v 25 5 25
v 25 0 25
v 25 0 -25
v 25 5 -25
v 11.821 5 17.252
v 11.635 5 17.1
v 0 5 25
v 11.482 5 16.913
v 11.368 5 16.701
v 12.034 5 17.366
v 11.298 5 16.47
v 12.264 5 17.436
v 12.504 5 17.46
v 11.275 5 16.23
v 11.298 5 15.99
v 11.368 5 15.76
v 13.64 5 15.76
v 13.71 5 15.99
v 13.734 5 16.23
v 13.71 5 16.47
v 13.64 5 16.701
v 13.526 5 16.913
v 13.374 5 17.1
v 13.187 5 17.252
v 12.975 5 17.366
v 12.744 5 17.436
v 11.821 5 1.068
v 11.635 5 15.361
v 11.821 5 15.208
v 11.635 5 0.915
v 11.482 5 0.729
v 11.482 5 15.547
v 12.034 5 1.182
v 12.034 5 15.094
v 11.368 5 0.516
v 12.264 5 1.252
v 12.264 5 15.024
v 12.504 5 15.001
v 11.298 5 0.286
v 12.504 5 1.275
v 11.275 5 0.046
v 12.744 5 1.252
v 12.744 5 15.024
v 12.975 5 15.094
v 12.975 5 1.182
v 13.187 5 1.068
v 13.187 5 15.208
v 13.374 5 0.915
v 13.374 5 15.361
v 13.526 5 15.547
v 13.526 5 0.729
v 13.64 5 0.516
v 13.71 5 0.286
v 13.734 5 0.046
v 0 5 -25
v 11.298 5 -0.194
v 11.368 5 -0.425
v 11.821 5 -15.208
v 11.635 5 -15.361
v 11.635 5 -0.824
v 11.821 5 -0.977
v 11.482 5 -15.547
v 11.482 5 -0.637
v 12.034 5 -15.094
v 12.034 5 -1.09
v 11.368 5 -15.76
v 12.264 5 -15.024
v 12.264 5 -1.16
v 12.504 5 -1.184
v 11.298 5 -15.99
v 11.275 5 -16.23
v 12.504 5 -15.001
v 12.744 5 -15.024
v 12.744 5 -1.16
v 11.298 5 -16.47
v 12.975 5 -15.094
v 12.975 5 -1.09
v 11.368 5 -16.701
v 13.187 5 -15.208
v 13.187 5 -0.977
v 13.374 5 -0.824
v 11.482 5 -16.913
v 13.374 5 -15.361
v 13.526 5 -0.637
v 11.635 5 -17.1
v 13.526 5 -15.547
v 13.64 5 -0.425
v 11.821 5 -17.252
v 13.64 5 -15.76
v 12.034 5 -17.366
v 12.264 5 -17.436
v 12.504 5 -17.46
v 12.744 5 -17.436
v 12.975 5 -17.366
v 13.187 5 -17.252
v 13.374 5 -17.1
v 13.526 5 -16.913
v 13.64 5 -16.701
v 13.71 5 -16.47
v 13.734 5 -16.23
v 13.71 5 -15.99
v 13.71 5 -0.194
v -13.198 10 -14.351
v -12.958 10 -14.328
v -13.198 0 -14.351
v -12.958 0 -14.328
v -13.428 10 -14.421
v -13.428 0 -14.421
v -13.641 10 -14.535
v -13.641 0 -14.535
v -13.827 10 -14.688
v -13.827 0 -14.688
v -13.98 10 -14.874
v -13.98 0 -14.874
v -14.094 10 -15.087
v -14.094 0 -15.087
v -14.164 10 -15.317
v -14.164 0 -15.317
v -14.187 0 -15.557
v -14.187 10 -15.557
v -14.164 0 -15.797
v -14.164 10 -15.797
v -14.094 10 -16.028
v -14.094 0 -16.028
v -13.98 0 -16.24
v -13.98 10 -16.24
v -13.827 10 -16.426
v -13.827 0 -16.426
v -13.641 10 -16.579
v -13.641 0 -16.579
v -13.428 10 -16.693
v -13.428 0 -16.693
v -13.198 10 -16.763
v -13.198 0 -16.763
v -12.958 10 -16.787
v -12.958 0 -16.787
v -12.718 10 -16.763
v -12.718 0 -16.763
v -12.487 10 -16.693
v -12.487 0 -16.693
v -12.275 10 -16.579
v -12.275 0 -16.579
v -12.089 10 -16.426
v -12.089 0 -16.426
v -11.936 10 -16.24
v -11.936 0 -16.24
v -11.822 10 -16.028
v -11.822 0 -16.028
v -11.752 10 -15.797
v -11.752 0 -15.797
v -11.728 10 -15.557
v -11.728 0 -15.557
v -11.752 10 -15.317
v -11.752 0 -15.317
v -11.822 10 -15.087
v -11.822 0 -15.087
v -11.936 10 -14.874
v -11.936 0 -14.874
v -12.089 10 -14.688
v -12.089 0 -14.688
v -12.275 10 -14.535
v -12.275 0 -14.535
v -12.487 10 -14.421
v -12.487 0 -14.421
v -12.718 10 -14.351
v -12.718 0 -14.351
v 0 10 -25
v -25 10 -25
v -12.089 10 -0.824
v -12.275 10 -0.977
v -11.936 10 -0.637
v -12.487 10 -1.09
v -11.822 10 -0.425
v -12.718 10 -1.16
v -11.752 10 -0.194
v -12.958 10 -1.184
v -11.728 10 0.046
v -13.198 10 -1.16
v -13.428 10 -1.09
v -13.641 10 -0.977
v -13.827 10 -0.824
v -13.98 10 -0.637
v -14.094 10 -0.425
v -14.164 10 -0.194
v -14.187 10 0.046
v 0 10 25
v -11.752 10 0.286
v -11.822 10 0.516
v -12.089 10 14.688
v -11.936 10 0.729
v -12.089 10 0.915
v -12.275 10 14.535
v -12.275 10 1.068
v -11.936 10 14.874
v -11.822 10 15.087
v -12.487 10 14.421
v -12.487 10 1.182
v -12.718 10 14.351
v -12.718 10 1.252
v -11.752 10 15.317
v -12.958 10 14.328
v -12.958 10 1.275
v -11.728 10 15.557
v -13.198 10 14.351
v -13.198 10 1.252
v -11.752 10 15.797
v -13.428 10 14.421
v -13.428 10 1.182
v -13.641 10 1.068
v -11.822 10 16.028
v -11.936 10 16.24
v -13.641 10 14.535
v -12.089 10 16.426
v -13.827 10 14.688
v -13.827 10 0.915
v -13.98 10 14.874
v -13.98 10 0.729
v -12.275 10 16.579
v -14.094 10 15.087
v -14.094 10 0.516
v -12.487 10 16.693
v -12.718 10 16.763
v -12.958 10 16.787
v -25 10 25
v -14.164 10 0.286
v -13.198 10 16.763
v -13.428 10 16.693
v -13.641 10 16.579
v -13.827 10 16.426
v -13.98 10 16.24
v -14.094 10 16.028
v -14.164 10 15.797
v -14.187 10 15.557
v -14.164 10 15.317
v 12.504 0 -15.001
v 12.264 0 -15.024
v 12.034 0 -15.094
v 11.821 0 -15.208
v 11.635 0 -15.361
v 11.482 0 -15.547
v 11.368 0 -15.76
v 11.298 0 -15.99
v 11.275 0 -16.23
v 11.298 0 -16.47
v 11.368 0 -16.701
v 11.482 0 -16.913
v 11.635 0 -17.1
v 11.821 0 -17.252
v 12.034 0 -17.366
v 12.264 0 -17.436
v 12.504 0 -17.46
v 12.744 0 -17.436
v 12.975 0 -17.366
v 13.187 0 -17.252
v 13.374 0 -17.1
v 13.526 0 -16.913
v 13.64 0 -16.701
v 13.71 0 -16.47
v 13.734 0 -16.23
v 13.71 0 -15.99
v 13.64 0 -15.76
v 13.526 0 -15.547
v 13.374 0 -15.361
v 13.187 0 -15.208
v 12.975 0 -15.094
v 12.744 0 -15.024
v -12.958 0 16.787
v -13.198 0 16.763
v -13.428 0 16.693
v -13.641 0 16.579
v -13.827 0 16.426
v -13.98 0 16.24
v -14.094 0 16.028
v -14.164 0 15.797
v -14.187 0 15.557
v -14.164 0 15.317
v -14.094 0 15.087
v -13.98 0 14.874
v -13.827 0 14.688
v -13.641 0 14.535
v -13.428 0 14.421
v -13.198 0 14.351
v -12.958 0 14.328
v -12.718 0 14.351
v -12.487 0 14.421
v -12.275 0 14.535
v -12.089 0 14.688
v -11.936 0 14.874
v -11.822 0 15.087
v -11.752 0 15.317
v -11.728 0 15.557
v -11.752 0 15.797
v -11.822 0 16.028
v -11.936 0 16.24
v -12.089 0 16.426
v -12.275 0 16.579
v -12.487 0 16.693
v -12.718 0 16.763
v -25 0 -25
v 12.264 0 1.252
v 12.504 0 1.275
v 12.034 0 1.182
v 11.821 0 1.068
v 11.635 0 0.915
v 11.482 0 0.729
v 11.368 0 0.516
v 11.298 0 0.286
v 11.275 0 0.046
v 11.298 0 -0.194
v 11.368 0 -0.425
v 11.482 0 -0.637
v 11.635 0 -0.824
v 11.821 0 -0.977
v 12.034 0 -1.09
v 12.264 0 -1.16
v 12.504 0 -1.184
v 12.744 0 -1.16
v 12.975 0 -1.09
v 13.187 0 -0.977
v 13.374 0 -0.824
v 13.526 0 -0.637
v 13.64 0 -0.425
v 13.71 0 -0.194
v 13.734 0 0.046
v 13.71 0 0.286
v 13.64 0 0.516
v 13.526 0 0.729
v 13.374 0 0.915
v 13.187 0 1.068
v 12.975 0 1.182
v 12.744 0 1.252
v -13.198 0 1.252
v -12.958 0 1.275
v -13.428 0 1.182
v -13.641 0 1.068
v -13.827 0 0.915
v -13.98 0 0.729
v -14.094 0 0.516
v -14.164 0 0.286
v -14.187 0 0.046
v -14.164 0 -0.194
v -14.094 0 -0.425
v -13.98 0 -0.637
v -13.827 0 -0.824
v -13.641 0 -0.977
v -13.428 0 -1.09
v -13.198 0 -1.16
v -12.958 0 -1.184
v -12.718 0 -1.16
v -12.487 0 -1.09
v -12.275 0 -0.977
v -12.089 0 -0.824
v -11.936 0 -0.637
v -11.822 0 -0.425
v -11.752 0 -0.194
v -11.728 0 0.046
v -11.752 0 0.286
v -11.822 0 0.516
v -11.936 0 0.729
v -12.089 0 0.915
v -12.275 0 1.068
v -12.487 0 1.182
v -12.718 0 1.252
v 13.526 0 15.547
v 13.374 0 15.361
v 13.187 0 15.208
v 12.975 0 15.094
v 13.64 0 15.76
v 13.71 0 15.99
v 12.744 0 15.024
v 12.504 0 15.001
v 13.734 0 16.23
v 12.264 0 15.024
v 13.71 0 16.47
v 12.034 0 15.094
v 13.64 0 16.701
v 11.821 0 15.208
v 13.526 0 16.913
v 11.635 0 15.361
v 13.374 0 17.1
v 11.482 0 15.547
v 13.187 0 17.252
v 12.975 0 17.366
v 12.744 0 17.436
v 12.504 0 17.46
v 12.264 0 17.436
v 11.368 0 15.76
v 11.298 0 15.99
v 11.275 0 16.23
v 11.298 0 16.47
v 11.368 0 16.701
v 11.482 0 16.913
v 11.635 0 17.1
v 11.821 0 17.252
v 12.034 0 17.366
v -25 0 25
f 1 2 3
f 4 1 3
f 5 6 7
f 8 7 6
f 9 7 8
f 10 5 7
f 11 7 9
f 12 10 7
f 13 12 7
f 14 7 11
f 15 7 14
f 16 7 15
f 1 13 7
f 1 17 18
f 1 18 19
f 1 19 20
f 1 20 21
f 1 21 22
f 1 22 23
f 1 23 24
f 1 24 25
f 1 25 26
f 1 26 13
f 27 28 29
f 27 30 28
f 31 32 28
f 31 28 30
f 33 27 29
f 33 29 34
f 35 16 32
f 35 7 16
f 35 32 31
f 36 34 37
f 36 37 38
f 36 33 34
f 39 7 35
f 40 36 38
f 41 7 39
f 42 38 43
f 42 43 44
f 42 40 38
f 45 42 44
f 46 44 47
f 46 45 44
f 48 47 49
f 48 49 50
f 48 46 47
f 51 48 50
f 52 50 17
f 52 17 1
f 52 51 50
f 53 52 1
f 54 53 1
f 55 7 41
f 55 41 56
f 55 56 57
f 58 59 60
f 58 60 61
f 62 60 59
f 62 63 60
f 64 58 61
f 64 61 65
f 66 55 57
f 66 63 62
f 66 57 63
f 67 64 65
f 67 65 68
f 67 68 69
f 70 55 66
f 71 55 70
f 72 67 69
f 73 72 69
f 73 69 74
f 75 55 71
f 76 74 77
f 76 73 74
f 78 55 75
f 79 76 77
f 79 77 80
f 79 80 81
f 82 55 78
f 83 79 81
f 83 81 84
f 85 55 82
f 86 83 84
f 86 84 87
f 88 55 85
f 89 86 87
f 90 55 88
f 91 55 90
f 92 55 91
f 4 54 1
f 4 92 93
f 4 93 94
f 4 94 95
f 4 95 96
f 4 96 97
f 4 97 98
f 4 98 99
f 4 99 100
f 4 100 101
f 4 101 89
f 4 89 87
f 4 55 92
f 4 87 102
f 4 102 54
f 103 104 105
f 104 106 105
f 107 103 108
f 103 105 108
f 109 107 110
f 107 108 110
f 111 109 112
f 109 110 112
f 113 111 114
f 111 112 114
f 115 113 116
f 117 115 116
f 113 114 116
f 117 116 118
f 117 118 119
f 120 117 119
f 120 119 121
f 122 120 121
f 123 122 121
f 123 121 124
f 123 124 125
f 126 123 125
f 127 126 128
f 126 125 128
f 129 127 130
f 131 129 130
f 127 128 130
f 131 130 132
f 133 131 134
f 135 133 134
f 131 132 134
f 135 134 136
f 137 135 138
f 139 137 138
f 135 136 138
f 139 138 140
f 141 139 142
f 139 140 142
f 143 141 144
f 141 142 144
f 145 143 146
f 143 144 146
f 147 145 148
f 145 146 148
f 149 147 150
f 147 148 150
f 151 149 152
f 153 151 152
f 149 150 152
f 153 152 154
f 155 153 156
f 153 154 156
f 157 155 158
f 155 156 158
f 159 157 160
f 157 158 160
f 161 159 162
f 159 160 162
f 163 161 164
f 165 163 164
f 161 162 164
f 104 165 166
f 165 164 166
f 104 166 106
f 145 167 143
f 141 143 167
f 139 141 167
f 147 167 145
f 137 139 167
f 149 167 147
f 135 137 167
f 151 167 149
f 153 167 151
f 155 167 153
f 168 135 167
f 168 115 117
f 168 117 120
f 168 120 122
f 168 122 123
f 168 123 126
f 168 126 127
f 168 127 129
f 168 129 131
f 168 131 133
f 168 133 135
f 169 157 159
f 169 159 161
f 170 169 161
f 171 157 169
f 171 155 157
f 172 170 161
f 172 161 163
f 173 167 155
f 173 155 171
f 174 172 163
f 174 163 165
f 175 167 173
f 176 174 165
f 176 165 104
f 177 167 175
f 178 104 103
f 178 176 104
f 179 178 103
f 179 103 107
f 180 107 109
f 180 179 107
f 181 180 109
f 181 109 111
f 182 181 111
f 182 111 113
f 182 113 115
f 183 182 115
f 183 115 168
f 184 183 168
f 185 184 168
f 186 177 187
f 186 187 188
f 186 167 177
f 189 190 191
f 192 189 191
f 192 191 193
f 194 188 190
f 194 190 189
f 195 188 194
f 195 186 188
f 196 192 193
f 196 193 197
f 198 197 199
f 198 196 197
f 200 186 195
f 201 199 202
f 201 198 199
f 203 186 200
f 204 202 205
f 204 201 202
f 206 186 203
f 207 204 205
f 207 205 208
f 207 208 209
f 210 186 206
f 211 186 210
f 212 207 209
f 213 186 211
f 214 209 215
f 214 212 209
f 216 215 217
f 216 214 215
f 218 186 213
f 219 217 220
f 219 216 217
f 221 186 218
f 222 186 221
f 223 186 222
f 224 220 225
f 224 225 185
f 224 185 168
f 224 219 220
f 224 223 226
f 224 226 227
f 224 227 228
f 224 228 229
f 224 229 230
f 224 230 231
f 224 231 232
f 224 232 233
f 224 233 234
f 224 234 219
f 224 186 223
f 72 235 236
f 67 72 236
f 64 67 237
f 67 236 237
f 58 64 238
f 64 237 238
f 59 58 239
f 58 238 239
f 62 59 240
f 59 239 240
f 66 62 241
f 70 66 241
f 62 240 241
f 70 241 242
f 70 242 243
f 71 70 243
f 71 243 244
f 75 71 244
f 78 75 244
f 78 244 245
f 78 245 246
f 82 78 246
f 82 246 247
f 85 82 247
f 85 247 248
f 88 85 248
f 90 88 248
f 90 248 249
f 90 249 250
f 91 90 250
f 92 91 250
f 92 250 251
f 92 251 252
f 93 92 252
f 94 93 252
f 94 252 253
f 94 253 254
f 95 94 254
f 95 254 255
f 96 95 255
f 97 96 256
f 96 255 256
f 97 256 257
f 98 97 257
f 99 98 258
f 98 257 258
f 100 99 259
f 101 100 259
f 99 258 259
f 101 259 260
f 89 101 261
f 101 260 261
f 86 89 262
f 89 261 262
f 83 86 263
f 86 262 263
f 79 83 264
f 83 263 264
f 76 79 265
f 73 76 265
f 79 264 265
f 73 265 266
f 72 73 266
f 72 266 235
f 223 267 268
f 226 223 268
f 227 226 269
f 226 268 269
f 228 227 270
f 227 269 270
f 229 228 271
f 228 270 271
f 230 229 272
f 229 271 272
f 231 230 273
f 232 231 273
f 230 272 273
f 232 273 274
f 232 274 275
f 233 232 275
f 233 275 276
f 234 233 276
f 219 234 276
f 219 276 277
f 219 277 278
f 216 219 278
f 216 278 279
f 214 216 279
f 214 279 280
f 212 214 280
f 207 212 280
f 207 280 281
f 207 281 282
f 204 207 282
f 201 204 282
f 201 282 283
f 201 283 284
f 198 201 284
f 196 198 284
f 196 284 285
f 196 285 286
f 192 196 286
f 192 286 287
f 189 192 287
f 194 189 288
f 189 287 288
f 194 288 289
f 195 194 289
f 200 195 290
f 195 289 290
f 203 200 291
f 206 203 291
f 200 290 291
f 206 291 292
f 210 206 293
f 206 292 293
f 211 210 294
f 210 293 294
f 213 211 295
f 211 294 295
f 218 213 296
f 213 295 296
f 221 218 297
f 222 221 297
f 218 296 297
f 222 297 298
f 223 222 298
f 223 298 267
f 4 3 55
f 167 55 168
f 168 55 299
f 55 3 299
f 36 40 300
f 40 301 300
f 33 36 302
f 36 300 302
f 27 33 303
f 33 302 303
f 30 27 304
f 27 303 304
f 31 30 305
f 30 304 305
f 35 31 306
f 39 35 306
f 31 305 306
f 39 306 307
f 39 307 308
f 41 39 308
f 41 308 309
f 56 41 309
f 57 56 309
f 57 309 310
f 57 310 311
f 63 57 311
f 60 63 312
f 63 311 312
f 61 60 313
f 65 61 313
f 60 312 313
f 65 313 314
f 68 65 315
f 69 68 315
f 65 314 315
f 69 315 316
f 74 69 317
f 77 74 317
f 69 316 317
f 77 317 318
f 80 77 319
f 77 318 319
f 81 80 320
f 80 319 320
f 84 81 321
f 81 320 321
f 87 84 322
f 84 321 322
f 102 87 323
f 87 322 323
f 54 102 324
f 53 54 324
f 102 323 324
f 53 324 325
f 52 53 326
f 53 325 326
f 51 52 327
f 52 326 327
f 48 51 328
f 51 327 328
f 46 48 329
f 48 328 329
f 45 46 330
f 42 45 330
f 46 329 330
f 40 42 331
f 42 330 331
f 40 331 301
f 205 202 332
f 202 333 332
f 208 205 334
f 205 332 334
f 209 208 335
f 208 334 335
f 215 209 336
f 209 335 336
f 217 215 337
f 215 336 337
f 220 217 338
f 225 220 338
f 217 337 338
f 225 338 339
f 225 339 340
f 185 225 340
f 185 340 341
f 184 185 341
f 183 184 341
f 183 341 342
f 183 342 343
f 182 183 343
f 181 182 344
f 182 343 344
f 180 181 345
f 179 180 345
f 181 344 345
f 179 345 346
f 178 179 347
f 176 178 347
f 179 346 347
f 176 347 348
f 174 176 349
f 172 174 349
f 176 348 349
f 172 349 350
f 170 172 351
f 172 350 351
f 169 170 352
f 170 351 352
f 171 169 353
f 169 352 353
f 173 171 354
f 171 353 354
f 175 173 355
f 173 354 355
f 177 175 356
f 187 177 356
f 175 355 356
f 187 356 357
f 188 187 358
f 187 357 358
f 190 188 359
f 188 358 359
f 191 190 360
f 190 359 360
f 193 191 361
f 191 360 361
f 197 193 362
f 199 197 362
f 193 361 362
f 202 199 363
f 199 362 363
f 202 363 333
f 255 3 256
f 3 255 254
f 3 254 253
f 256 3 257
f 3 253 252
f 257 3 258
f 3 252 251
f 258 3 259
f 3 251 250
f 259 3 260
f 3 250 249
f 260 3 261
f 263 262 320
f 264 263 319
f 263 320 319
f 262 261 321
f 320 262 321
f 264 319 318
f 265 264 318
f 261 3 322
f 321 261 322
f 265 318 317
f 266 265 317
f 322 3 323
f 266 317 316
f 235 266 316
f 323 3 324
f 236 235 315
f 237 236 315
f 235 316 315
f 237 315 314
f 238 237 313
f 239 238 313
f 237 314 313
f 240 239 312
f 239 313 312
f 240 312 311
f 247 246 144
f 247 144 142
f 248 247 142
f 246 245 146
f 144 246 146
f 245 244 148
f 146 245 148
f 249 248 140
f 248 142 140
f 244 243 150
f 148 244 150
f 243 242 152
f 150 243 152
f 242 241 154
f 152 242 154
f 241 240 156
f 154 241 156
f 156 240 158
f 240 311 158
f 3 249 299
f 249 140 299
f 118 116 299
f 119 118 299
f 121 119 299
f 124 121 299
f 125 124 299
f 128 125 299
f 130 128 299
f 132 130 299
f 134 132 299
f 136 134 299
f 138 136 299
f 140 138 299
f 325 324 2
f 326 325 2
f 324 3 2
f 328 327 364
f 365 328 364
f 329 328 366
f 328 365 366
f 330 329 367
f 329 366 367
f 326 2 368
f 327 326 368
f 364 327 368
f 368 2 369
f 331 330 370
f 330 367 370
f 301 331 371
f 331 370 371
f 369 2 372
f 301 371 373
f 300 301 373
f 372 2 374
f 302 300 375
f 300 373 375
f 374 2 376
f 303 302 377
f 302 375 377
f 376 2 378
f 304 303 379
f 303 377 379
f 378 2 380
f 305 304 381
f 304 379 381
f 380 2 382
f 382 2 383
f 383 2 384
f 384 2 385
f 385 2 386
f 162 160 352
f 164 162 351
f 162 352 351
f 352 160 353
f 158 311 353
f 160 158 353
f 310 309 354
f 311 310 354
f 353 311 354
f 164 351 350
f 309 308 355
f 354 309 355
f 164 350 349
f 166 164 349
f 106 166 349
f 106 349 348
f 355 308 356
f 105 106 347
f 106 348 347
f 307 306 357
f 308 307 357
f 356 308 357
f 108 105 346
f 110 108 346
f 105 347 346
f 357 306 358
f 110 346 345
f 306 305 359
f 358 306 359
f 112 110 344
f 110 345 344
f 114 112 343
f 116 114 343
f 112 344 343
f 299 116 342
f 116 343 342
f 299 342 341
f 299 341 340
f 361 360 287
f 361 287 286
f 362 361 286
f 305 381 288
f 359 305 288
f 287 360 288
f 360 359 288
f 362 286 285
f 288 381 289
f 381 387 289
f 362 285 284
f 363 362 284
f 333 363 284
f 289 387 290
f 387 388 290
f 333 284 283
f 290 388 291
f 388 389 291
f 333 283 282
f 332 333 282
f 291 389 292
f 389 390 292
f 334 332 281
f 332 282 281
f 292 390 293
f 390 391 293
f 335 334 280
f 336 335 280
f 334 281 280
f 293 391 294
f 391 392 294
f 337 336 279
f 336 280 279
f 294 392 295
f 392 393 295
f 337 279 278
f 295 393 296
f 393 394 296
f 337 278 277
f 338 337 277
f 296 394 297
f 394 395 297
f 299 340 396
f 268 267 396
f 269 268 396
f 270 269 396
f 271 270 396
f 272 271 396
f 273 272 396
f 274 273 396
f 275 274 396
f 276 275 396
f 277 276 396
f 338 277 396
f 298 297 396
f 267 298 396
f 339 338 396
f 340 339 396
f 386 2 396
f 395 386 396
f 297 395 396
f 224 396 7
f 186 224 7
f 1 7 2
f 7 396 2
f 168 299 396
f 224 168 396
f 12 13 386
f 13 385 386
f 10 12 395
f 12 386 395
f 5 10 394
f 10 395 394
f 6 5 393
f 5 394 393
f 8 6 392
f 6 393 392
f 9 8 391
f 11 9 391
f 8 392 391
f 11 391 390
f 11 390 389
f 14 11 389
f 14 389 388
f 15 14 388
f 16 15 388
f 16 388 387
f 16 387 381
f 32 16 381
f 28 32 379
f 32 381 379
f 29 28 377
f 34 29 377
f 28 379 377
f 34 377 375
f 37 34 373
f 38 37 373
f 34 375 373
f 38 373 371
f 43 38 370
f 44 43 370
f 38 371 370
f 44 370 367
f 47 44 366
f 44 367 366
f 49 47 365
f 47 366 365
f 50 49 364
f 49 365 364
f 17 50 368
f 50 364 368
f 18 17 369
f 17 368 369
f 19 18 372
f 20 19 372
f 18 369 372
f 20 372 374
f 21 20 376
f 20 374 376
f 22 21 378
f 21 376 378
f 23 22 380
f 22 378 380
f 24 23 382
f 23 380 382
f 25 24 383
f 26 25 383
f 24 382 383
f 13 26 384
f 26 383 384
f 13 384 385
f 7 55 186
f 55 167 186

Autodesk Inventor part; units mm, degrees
ref_plane "YZ Plane" through (0, 0, 0) normal (1, 0, 0) x (0, 1, 0)
ref_plane "XZ Plane" through (0, 0, 0) normal (0, 1, 0) x (-1, 0, 0)
ref_plane "XY Plane" through (0, 0, 0) normal (0, 0, 1) x (1, 0, 0)
sketch "Sketch1" plane through (0, 0, 0) normal (0, 1, 0) x (-1, 0, 0)
  line L0 (25, 25) -> (-25, 25)
  line L1 (-25, 25) -> (-25, -25)
  line L2 (-25, -25) -> (25, -25)
  line L3 (25, -25) -> (25, 25)
  line L4 (35, 0) -> (-35, 0) projected
  line L5 (0, -35) -> (0, 35) projected
  point P0 (0, 0)
  dimension "d0" = 50
  dimension "d1" = 50
extrude "Extrusion1" add sketch "Sketch1" along normal blind 10
sketch "Sketch2" plane through (0, 10, 0) normal (0, 1, 0) x (1, 0, 0)
  line L0 (-25, -25) -> (25, -25) projected
  line L1 (25, -25) -> (25, 25) projected
  line L2 (0, -25) -> (25, -25)
  line L3 (25, -25) -> (25, 25)
  line L4 (25, 25) -> (0, 25)
  line L5 (0, 25) -> (0, -25)
  point P0 (0, 0)
extrude "Extrusion2" cut sketch "Sketch2" against normal blind 5
sketch "Sketch3" plane through (0, 10, 0) normal (0, 1, 0) x (1, 0, 0)
  line L0 (-12.9579, -25.0914) -> (-12.9579, 25) construction
  line L1 (25, 25) -> (-25, 25) construction
  line L2 (12.5042, -25.0914) -> (12.5042, 25) construction
  line L3 (-35, 0) -> (35, 0) construction
  point P0 (0, 0)
  point P1 (-12.9579, -0.0457)
  point P2 (-12.9579, -15.5571)
  point P3 (-12.9579, 15.5571)
  point P4 (12.5042, -16.2302)
  point P5 (12.5042, -0.0457)
  point P6 (12.5042, 16.2302)
hole "Hole1" at (-12.9579, 10, 0.0457) at (-12.9579, 10, -15.5571) at (12.5042, 10, 16.2302) at (12.5042, 10, 0.0457) at (12.5042, 10, -16.2302) at (-12.9579, 10, 15.5571) direction (0, -1, 0) diameter 2.459 depth 10 thread size "M3x0.5" class "6H" standard "ISO Metric profile"
equation "\"d1\" = d0"
properties part number "screwbase"
